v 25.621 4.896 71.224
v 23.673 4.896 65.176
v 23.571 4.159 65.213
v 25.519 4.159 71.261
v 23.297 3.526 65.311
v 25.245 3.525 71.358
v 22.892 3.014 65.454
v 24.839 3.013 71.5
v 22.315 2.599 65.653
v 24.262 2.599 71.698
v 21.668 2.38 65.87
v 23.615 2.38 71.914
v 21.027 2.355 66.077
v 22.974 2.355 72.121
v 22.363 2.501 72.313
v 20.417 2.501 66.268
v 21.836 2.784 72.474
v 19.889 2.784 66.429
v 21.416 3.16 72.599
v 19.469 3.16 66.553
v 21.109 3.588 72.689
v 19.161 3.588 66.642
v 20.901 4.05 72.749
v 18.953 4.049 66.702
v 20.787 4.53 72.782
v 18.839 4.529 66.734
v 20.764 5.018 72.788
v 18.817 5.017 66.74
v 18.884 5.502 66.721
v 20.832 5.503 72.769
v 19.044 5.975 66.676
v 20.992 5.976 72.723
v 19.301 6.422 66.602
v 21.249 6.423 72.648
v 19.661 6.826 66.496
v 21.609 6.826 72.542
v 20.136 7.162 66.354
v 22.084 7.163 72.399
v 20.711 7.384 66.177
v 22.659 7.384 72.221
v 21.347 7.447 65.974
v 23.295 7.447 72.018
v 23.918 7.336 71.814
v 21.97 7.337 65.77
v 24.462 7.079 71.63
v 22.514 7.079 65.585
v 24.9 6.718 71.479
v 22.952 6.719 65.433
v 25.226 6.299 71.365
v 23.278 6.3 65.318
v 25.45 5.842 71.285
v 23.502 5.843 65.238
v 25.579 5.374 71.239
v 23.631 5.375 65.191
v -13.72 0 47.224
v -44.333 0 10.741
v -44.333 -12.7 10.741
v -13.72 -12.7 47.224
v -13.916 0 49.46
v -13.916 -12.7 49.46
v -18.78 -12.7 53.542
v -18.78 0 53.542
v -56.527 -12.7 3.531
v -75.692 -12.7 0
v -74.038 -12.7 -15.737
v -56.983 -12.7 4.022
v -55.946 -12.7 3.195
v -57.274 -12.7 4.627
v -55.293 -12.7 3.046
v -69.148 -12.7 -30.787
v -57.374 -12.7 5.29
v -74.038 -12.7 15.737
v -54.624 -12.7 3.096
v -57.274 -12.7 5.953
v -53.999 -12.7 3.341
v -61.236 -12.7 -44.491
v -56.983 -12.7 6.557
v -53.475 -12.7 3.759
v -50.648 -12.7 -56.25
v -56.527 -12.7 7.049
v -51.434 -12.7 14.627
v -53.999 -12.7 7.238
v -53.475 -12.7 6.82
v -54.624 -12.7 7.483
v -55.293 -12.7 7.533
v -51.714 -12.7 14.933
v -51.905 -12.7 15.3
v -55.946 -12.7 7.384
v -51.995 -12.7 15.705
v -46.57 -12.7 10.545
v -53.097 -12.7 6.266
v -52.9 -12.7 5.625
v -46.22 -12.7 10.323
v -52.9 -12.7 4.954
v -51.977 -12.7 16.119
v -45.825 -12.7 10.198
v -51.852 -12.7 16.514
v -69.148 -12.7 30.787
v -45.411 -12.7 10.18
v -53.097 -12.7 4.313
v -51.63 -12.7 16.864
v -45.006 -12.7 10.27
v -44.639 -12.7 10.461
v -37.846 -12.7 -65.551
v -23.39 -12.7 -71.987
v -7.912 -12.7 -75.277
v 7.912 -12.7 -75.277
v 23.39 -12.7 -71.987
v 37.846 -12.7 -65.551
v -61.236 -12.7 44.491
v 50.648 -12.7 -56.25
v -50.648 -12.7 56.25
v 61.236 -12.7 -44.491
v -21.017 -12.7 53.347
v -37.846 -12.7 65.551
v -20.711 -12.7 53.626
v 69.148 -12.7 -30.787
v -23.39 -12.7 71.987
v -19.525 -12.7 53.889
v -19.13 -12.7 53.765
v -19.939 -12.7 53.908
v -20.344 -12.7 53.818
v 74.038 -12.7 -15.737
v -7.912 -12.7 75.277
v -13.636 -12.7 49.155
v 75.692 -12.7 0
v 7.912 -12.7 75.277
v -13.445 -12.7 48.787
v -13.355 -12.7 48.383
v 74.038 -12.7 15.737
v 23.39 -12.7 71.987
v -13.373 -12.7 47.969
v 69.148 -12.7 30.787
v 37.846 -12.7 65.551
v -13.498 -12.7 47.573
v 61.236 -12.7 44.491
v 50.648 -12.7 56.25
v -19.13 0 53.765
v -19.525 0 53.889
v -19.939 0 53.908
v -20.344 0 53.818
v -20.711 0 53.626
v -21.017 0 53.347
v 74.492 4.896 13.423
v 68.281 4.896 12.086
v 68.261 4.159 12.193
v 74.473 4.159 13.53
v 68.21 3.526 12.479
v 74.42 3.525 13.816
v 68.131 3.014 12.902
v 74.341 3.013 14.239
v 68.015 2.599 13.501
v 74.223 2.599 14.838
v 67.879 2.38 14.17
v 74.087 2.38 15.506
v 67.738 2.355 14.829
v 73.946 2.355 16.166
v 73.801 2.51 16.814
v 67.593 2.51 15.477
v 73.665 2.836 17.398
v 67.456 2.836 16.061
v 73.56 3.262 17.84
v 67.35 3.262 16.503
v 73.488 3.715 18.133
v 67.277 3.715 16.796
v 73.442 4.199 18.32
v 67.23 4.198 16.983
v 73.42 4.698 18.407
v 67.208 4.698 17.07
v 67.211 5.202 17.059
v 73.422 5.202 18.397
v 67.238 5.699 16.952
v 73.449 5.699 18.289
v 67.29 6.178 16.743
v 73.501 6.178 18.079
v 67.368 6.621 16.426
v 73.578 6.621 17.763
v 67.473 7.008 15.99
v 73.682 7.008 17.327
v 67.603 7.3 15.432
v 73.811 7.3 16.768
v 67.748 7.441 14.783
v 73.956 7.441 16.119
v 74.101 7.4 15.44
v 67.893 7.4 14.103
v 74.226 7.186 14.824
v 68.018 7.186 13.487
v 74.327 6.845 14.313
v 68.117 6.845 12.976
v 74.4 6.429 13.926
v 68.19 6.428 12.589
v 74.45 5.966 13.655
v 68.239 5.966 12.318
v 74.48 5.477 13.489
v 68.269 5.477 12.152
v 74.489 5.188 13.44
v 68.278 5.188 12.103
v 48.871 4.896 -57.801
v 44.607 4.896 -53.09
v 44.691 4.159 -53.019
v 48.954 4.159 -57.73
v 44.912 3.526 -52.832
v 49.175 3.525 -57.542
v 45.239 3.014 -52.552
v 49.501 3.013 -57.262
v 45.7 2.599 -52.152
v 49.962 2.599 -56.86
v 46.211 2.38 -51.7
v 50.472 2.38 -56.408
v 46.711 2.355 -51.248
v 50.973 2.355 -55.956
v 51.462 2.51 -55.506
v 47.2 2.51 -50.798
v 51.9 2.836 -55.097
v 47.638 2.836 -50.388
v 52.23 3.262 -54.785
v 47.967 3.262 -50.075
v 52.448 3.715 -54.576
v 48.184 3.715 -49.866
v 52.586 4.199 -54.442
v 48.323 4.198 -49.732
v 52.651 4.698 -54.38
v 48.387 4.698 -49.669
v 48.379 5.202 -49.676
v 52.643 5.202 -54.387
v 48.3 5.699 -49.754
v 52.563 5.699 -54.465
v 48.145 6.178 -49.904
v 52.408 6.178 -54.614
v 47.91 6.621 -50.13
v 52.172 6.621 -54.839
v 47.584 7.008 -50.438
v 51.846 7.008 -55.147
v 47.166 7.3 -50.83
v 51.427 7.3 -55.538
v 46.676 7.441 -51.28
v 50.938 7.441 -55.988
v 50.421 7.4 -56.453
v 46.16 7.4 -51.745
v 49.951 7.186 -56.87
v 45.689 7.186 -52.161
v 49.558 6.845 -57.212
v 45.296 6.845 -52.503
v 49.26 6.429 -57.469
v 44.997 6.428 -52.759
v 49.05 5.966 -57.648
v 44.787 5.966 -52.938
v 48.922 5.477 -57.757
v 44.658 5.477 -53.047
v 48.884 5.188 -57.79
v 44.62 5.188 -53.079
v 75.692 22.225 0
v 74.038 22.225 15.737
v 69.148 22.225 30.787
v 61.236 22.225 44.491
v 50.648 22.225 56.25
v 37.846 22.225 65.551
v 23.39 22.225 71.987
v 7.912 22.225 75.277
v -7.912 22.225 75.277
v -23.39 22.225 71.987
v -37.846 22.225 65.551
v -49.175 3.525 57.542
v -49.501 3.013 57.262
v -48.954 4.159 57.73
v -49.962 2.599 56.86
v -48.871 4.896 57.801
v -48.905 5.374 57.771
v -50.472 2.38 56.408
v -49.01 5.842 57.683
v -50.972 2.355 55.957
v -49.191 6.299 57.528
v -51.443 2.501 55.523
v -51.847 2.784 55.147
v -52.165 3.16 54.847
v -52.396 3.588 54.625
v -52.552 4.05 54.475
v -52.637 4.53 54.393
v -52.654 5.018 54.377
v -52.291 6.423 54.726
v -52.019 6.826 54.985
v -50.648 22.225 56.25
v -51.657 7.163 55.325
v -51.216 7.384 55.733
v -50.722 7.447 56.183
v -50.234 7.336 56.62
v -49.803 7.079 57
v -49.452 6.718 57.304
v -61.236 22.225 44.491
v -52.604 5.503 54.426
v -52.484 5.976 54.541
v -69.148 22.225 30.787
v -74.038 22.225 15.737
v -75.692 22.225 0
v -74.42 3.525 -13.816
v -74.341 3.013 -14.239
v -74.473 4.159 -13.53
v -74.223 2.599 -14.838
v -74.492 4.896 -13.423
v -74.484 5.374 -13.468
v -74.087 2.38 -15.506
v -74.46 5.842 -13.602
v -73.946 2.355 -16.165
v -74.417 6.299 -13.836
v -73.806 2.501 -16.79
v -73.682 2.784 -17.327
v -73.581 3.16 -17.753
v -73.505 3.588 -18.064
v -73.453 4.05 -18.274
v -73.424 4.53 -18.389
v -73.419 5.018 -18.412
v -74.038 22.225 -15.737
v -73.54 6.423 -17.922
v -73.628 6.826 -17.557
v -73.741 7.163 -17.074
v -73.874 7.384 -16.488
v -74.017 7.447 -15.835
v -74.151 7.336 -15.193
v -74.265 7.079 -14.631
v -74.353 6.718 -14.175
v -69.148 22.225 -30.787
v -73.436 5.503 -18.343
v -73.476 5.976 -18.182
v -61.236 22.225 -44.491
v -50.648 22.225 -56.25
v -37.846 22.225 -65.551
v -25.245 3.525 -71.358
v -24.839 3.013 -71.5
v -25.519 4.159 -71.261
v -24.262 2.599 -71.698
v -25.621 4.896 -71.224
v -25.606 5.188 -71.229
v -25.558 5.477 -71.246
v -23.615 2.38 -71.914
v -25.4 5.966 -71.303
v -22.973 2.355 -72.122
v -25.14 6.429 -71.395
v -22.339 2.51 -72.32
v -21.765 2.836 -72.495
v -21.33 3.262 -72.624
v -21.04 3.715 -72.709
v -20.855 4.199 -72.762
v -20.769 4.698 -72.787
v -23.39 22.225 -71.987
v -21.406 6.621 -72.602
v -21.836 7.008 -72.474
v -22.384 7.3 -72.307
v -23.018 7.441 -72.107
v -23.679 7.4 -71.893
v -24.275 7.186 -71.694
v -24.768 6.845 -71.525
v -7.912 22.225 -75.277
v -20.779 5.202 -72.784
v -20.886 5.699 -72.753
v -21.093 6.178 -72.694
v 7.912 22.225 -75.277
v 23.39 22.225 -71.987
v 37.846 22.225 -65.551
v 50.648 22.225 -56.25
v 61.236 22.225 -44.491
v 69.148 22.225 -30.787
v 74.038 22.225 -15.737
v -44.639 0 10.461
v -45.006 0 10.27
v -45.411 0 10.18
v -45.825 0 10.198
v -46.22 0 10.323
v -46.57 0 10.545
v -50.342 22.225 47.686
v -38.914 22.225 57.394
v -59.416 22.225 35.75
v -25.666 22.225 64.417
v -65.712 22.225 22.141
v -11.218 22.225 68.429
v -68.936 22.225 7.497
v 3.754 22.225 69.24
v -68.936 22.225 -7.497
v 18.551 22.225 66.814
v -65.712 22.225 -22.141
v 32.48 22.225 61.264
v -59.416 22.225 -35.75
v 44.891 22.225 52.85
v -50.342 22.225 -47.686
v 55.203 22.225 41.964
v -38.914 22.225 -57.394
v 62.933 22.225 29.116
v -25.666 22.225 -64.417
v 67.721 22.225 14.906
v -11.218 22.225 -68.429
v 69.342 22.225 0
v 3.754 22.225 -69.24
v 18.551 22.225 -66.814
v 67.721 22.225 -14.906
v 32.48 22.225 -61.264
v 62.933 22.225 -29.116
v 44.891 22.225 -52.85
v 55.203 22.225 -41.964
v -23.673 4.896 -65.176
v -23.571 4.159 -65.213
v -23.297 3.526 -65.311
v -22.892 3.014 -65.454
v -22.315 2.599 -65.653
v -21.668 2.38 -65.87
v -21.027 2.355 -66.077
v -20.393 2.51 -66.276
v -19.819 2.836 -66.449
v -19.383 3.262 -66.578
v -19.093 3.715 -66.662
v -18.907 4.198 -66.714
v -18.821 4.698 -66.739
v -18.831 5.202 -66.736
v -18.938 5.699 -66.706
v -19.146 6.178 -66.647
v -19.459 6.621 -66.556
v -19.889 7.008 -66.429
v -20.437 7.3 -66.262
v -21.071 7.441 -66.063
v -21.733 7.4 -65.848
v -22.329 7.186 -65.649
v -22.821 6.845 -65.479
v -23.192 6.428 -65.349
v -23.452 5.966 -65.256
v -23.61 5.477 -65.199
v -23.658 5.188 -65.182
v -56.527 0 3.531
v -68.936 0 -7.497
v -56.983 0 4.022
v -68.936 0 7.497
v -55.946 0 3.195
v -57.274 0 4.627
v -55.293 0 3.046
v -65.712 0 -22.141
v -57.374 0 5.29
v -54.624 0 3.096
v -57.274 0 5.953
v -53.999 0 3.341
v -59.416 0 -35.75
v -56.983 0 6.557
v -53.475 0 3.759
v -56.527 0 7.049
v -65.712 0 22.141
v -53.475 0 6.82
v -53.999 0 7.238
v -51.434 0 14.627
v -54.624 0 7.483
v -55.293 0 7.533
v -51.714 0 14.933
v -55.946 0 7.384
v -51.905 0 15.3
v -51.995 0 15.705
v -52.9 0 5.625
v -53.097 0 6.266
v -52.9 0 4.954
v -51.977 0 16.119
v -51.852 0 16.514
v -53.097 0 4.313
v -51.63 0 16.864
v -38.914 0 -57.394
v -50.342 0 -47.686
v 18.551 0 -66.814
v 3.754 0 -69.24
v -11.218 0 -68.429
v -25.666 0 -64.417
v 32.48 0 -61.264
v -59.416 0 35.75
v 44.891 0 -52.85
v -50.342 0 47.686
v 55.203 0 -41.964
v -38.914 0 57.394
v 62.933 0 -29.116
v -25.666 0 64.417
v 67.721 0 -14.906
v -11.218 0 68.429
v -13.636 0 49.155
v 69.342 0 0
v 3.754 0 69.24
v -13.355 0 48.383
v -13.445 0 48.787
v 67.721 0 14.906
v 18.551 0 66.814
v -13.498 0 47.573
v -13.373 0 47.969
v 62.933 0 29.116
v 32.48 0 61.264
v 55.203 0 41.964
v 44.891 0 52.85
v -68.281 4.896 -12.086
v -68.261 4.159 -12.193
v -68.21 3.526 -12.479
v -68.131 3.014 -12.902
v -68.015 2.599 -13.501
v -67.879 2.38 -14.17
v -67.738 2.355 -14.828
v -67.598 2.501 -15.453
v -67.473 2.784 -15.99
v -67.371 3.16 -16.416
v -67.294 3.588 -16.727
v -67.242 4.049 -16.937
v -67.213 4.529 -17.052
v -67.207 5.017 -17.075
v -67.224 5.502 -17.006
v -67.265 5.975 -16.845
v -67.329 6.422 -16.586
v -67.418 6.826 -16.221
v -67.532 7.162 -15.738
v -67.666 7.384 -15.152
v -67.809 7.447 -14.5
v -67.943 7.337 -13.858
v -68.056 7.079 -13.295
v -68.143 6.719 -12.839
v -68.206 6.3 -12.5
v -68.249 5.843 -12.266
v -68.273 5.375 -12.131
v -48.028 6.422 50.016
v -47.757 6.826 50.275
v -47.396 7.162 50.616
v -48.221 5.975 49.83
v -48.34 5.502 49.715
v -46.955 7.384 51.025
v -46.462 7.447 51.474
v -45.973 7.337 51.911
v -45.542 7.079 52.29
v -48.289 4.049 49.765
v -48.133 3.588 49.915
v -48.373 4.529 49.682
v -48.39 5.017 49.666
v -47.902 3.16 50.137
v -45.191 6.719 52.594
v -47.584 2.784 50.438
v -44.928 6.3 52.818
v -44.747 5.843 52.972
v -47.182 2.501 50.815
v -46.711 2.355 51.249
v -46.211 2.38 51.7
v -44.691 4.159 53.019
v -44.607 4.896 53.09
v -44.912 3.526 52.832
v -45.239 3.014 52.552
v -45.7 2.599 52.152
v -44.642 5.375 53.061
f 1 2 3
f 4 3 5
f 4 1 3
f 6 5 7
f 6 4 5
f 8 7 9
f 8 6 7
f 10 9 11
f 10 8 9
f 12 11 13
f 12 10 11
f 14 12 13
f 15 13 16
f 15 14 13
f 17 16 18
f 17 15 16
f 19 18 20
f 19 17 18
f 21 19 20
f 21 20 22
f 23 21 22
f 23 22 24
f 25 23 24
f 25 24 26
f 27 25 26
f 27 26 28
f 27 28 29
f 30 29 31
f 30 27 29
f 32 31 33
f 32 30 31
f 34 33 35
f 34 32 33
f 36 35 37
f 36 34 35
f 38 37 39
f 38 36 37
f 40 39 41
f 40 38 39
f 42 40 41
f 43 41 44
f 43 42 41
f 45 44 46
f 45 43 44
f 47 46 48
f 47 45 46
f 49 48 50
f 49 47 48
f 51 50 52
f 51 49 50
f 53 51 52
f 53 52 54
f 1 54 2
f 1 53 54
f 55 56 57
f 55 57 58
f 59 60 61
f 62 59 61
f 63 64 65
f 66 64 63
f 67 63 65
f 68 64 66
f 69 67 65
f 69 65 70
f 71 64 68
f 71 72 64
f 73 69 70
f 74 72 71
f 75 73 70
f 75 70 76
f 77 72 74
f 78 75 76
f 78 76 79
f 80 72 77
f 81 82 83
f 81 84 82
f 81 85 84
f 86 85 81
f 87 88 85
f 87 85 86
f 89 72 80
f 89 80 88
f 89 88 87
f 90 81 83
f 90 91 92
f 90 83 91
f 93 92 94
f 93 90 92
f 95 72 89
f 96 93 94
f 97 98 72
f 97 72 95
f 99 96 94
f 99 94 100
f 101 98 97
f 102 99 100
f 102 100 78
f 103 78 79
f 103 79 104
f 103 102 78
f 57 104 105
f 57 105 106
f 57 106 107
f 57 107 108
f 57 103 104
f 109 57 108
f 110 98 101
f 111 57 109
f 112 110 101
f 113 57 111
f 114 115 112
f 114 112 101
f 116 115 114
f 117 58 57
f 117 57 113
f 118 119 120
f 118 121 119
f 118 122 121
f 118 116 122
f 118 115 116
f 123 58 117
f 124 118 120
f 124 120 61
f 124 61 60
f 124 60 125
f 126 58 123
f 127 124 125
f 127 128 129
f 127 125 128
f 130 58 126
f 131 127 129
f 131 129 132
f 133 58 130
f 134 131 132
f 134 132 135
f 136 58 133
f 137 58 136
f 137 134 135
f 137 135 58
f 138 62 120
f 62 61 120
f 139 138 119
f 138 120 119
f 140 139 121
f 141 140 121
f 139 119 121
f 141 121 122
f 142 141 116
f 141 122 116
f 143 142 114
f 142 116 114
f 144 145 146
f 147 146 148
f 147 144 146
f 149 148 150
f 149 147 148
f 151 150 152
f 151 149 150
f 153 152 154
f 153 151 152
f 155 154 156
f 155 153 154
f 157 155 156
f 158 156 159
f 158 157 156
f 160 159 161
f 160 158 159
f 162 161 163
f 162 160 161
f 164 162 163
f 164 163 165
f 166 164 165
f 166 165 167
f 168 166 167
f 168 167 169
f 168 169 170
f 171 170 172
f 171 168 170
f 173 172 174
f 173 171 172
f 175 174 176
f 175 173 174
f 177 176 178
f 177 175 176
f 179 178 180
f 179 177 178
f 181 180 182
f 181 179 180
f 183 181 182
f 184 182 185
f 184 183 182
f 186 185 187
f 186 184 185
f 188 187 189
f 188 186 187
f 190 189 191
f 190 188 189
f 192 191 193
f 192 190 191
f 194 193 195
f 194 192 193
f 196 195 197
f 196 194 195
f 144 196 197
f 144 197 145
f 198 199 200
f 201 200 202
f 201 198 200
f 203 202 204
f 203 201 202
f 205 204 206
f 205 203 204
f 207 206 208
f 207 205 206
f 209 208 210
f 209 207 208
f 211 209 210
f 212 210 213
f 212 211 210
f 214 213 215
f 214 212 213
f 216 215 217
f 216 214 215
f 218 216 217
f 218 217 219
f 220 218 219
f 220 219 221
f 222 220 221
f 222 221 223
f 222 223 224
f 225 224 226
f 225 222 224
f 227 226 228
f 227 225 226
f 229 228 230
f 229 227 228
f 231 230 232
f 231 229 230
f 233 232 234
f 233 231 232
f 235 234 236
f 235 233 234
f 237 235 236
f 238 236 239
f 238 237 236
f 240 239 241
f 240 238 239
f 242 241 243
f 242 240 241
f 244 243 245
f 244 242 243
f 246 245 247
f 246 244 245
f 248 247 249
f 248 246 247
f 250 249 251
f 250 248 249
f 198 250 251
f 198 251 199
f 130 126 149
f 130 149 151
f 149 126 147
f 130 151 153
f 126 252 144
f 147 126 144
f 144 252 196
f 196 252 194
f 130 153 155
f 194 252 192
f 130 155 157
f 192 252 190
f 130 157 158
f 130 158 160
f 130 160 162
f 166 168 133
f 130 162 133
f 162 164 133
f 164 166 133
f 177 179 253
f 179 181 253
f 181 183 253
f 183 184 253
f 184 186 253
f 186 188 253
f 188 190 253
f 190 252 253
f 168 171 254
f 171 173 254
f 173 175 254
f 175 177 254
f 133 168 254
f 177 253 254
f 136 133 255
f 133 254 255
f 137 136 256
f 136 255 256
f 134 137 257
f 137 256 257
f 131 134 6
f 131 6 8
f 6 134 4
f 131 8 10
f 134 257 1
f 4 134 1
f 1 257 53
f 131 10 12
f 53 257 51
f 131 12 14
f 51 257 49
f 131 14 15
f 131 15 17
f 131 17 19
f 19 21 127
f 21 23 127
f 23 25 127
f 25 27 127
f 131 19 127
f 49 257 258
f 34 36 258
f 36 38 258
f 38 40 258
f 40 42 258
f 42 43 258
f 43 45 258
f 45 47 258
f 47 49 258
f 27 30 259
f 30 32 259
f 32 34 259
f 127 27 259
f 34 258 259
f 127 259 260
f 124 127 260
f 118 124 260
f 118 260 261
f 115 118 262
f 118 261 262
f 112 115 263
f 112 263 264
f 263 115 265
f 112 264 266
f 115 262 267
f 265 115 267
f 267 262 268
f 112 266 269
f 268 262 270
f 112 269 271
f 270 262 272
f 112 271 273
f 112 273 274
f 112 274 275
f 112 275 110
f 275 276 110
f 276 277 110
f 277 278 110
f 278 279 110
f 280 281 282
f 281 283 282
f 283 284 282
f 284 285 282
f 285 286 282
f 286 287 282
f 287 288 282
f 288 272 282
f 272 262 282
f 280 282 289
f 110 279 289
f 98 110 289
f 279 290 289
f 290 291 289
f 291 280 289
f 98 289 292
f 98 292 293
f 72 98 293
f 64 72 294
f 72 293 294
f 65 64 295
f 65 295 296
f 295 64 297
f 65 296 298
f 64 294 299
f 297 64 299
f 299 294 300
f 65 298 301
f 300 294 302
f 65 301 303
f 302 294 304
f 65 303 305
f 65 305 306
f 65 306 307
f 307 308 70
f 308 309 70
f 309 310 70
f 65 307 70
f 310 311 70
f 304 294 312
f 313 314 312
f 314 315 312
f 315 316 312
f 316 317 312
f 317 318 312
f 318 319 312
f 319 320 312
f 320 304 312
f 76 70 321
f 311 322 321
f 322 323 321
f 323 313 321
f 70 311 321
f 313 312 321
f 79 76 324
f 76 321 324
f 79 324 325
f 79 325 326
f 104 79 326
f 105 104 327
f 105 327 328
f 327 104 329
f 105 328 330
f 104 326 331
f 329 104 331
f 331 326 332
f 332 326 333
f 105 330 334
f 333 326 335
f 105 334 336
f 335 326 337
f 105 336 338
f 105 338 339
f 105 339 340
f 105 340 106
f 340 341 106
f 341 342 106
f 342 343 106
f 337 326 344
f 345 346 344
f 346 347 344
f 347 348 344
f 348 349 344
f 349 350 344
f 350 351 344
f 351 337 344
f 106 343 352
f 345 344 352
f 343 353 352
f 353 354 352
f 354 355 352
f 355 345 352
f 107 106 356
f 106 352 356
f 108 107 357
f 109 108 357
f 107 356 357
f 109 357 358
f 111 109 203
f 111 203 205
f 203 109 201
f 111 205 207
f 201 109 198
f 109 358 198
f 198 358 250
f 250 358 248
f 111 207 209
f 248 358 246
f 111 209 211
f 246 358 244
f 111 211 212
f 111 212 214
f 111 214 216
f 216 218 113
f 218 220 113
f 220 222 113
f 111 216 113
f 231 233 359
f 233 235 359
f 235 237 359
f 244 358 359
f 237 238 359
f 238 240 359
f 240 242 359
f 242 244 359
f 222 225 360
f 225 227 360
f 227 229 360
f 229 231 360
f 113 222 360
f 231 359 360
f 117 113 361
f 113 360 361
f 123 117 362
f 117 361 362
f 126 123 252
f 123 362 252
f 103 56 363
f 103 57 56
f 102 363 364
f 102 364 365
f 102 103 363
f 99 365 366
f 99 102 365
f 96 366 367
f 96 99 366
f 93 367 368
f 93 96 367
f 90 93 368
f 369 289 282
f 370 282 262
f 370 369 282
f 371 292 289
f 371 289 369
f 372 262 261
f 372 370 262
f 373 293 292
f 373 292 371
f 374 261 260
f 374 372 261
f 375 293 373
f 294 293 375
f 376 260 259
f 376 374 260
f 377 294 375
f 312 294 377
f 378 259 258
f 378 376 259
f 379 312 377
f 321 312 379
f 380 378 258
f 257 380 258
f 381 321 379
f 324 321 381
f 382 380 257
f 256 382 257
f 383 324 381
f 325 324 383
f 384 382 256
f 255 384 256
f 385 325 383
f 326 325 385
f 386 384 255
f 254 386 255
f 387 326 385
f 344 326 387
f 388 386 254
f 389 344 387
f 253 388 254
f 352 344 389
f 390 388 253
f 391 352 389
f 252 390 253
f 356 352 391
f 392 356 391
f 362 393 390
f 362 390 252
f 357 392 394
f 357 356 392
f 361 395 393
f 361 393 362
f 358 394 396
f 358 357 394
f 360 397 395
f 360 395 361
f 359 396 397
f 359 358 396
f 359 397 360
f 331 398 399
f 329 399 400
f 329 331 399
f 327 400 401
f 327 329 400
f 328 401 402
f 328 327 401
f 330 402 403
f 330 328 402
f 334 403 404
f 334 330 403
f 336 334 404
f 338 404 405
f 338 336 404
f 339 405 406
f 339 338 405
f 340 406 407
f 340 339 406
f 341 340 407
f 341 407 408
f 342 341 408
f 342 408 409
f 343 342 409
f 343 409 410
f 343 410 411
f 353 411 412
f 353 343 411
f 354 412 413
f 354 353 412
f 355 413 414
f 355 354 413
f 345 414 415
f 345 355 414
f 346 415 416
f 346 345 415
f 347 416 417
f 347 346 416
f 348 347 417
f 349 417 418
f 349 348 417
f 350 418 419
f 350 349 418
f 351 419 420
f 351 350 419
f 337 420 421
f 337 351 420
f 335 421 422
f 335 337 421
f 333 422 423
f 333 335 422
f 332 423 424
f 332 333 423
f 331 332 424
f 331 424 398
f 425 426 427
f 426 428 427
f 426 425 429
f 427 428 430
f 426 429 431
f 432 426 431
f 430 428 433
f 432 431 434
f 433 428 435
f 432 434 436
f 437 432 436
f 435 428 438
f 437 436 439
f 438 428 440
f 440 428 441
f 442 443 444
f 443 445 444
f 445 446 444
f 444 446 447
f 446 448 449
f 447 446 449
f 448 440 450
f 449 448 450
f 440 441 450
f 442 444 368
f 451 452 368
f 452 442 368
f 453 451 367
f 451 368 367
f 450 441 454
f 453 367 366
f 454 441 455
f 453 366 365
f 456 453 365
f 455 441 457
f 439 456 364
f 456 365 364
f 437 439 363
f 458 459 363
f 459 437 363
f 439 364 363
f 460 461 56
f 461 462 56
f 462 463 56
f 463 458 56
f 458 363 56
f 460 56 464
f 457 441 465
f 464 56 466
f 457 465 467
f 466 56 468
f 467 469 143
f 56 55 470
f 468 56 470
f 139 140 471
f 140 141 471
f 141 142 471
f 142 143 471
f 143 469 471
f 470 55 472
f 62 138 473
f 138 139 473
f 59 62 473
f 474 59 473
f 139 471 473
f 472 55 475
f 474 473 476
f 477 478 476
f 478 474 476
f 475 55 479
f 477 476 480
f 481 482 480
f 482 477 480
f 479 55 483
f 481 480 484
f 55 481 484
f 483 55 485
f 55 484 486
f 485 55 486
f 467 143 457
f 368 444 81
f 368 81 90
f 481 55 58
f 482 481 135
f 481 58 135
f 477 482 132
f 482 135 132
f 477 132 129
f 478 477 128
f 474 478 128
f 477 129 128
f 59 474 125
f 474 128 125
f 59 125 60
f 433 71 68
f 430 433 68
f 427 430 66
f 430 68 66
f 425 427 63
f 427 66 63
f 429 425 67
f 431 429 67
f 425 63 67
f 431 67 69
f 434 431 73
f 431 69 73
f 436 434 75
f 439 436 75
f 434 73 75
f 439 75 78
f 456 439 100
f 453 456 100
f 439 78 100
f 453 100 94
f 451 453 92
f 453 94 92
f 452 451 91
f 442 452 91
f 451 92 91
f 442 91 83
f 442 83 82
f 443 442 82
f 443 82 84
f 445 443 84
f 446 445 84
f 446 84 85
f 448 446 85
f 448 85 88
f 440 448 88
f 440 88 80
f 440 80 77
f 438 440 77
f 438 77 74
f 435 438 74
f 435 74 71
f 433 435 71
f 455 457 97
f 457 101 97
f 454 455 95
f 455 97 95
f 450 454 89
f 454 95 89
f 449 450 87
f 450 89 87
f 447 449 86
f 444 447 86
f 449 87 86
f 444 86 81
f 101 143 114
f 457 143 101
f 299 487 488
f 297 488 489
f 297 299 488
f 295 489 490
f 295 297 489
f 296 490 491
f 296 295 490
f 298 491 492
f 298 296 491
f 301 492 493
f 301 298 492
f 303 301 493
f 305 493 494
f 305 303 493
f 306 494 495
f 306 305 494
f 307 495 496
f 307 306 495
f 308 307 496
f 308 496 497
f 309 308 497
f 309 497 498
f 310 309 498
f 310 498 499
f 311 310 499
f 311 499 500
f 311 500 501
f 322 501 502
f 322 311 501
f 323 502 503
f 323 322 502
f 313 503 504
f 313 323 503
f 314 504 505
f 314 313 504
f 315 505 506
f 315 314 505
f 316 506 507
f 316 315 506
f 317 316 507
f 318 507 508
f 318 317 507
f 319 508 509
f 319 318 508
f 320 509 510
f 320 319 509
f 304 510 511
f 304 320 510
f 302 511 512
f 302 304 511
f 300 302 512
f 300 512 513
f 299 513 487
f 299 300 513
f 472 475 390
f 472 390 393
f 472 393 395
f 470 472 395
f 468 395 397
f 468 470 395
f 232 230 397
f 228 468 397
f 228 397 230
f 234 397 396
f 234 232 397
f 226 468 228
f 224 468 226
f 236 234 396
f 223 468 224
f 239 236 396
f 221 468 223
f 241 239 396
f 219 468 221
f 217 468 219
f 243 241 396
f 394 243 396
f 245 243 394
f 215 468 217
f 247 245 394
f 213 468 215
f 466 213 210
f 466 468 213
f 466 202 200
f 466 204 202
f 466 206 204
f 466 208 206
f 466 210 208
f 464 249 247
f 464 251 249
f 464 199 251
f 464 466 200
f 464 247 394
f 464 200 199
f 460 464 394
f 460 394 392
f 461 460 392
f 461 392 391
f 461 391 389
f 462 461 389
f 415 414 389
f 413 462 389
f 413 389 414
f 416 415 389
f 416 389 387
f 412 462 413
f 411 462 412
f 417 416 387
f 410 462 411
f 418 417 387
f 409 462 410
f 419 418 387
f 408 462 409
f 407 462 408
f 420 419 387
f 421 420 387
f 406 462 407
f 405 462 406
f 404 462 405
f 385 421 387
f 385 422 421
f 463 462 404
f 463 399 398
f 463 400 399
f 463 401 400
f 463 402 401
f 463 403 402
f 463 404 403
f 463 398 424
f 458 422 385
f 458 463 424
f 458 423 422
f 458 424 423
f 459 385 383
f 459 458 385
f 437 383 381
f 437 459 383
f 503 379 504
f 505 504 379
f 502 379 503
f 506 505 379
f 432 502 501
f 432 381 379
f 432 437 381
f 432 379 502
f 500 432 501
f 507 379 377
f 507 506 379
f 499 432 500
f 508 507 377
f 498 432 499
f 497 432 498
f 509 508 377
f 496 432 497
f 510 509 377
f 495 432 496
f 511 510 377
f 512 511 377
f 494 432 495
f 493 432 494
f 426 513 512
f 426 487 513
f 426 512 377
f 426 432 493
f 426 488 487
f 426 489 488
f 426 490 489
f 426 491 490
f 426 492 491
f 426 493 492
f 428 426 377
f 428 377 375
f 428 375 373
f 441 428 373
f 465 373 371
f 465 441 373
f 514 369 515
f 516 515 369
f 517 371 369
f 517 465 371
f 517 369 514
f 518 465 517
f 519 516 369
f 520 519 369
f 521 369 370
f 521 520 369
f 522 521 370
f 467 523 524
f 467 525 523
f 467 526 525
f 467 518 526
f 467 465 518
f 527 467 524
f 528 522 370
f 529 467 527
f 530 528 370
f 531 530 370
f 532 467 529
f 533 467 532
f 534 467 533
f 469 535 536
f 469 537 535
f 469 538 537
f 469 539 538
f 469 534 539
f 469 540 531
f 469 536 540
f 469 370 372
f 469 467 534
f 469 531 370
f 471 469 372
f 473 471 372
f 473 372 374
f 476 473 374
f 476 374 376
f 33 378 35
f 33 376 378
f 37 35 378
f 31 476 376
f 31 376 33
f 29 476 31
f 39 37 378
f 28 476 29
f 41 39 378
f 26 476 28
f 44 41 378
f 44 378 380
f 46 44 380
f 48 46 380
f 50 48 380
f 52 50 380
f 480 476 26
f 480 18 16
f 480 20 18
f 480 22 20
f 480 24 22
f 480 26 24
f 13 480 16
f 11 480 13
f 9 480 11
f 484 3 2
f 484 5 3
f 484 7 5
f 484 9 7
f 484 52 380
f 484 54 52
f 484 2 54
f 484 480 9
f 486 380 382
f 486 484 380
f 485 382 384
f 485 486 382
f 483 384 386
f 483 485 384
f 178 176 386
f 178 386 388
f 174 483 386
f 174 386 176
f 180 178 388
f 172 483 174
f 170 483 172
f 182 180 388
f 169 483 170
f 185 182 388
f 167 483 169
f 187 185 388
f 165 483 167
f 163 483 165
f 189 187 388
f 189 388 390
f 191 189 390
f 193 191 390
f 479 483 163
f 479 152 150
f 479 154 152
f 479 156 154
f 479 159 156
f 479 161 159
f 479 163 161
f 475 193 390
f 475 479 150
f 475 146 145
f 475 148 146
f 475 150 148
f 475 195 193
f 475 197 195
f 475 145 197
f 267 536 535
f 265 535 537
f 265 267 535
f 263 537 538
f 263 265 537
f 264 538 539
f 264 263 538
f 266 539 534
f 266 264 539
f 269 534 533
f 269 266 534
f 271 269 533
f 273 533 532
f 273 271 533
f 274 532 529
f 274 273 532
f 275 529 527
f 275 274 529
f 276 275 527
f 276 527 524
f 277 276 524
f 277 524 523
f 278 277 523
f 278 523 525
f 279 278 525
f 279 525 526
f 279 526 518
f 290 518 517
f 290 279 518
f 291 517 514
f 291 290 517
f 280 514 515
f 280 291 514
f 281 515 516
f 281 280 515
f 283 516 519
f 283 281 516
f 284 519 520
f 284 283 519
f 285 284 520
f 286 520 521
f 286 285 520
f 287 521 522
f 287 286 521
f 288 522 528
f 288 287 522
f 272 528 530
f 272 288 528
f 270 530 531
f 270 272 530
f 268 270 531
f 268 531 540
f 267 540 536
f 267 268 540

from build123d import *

# Parameters (mm, degrees)
SKETCH1_R                            = 75.692
SKETCH1_R_2                          = 69.342
BOSS_EXTRUDE1_DEPTH                  = 22.225
SKETCH2_R                            = 75.692
BOSS_EXTRUDE2_DEPTH                  = 12.7
TAP_DRILL_FOR_1_4_20_TAP1_AT_2_COUNT = 2
TAP_DRILL_FOR_1_4_20_TAP1_AT_2_PITCH = 53.488399339
CIRPATTERN1_COUNT                    = 6
CUT_EXTRUDE1_DEPTH                   = 13.7000001
FILLET1_R                            = 1.5875
M4_CLEARANCE_HOLE1_D                 = 4.5
M4_CLEARANCE_HOLE1_DEPTH             = 12.7


with BuildPart() as part:
    # Sketch1 → Boss-Extrude1 (new body)
    with BuildSketch(Plane(origin=(0, 0, 0), x_dir=(1, 0, 0), z_dir=(0, 1, 0))):
        Circle(SKETCH1_R)
        Circle(SKETCH1_R_2, mode=Mode.SUBTRACT)
    extrude(amount=BOSS_EXTRUDE1_DEPTH)

    # Sketch2 → Boss-Extrude2 (add)
    with BuildSketch(Plane.XZ):
        Circle(SKETCH2_R)
    extrude(amount=BOSS_EXTRUDE2_DEPTH)

    # Sketch4 → Tap Drill for 1/4-20 Tap1 (revolve, cut)
    with BuildSketch(Plane(origin=(73.997176623, 4.896298223, 15.927859738), x_dir=(0.210429897, 0, -0.97760895), z_dir=(0, 1, 0))):
        Polygon((0, 0), (0, 11.185816902), (2.5527, 9.652), (2.5527, 0), align=None)
    tap_drill_for_1_4_20_tap1 = revolve(axis=Axis((80.204993454, 4.896298223, 17.264089582), (-0.97760895, 0, -0.210429897)), mode=Mode.SUBTRACT)

    # Tap Drill for 1/4-20 Tap1 at 2: Tap Drill for 1/4-20 Tap1 ×2
    with Locations(*[Vector(-0.110438581, 0.851210999, 0.51307227) * (i * TAP_DRILL_FOR_1_4_20_TAP1_AT_2_PITCH) for i in range(1, TAP_DRILL_FOR_1_4_20_TAP1_AT_2_COUNT)]):
        add(tap_drill_for_1_4_20_tap1, mode=Mode.SUBTRACT)

    # CirPattern1: Tap Drill for 1/4-20 Tap1 ×6 about axis
    cirpattern1_axis = Axis((0, 22.225, 0), (0, -1, 0))
    for i in range(1, CIRPATTERN1_COUNT):
        add(tap_drill_for_1_4_20_tap1.rotate(cirpattern1_axis, i * 360 / CIRPATTERN1_COUNT), mode=Mode.SUBTRACT)

    # CirPattern1 copy 1 sketch → CirPattern1 copy 1 (revolve, cut)
    with BuildSketch(Plane(origin=(-3.515628412, 50.426212075, 80.653301416), x_dir=(0.951849134, 0, -0.306566839), z_dir=(0, 1, 0))):
        Polygon((0, 0), (0, 11.185816902), (2.5527, 9.652), (2.5527, 0), align=None)
    revolve(axis=Axis((-1.568928987, 50.426212075, 86.697543415), (-0.306566839, 0, -0.951849134)), mode=Mode.SUBTRACT)

    # CirPattern1 copy 2 sketch → CirPattern1 copy 2 (revolve, cut)
    with BuildSketch(Plane(origin=(-71.605622131, 50.426212075, 37.282027193), x_dir=(0.741419237, 0, 0.671042111), z_dir=(0, 1, 0))):
        Polygon((0, 0), (0, 11.185816902), (2.5527, 9.652), (2.5527, 0), align=None)
    revolve(axis=Axis((-75.866739537, 50.426212075, 41.990039348), (0.671042111, 0, -0.741419237)), mode=Mode.SUBTRACT)

    # CirPattern1 copy 3 sketch → CirPattern1 copy 3 (revolve, cut)
    with BuildSketch(Plane(origin=(-68.089993719, 50.426212075, -43.371274223), x_dir=(-0.210429897, 0, 0.97760895), z_dir=(0, 1, 0))):
        Polygon((0, 0), (0, 11.185816902), (2.5527, 9.652), (2.5527, 0), align=None)
    revolve(axis=Axis((-74.29781055, 50.426212075, -44.707504067), (0.97760895, 0, 0.210429897)), mode=Mode.SUBTRACT)

    # CirPattern1 copy 4 sketch → CirPattern1 copy 4 (revolve, cut)
    with BuildSketch(Plane(origin=(3.515628412, 50.426212075, -80.653301416), x_dir=(-0.951849134, 0, 0.306566839), z_dir=(0, 1, 0))):
        Polygon((0, 0), (0, 11.185816902), (2.5527, 9.652), (2.5527, 0), align=None)
    revolve(axis=Axis((1.568928987, 50.426212075, -86.697543415), (0.306566839, 0, 0.951849134)), mode=Mode.SUBTRACT)

    # CirPattern1 copy 5 sketch → CirPattern1 copy 5 (revolve, cut)
    with BuildSketch(Plane(origin=(71.605622131, 50.426212075, -37.282027193), x_dir=(-0.741419237, 0, -0.671042111), z_dir=(0, 1, 0))):
        Polygon((0, 0), (0, 11.185816902), (2.5527, 9.652), (2.5527, 0), align=None)
    revolve(axis=Axis((75.866739537, 50.426212075, -41.990039348), (-0.671042111, 0, 0.741419237)), mode=Mode.SUBTRACT)

    # Sketch5 → Cut-Extrude1 (cut, through all)
    with BuildSketch(Plane(origin=(0, 0, 0), x_dir=(1, 0, 0), z_dir=(0, 1, 0))):
        Polygon((-52.650183893, -15.647551982), (-45.353610572, -9.525), (-12.7, -48.44005771), (-19.996573321, -54.562609693), align=None)
    extrude(amount=-CUT_EXTRUDE1_DEPTH, mode=Mode.SUBTRACT)

    # Fillet1
    fillet1_edges = [part.edges().sort_by_distance(p)[0] for p in [
        (-19.996573321, -6.35, 54.562609693),
        (-52.650183893, -6.35, 15.647551982),
        (-45.353610572, -6.35, 9.525),
        (-12.7, -6.35, 48.44005771),
    ]]
    fillet(fillet1_edges, radius=FILLET1_R)

    # M4 Clearance Hole1
    with Locations(Plane(origin=(0, 0, 0), x_dir=(1, 0, 0), z_dir=(0, 1, 0))):
        with Locations((-55.124449215, -5.28970267)):
            Hole(M4_CLEARANCE_HOLE1_D / 2, depth=M4_CLEARANCE_HOLE1_DEPTH)


solid = part.part
